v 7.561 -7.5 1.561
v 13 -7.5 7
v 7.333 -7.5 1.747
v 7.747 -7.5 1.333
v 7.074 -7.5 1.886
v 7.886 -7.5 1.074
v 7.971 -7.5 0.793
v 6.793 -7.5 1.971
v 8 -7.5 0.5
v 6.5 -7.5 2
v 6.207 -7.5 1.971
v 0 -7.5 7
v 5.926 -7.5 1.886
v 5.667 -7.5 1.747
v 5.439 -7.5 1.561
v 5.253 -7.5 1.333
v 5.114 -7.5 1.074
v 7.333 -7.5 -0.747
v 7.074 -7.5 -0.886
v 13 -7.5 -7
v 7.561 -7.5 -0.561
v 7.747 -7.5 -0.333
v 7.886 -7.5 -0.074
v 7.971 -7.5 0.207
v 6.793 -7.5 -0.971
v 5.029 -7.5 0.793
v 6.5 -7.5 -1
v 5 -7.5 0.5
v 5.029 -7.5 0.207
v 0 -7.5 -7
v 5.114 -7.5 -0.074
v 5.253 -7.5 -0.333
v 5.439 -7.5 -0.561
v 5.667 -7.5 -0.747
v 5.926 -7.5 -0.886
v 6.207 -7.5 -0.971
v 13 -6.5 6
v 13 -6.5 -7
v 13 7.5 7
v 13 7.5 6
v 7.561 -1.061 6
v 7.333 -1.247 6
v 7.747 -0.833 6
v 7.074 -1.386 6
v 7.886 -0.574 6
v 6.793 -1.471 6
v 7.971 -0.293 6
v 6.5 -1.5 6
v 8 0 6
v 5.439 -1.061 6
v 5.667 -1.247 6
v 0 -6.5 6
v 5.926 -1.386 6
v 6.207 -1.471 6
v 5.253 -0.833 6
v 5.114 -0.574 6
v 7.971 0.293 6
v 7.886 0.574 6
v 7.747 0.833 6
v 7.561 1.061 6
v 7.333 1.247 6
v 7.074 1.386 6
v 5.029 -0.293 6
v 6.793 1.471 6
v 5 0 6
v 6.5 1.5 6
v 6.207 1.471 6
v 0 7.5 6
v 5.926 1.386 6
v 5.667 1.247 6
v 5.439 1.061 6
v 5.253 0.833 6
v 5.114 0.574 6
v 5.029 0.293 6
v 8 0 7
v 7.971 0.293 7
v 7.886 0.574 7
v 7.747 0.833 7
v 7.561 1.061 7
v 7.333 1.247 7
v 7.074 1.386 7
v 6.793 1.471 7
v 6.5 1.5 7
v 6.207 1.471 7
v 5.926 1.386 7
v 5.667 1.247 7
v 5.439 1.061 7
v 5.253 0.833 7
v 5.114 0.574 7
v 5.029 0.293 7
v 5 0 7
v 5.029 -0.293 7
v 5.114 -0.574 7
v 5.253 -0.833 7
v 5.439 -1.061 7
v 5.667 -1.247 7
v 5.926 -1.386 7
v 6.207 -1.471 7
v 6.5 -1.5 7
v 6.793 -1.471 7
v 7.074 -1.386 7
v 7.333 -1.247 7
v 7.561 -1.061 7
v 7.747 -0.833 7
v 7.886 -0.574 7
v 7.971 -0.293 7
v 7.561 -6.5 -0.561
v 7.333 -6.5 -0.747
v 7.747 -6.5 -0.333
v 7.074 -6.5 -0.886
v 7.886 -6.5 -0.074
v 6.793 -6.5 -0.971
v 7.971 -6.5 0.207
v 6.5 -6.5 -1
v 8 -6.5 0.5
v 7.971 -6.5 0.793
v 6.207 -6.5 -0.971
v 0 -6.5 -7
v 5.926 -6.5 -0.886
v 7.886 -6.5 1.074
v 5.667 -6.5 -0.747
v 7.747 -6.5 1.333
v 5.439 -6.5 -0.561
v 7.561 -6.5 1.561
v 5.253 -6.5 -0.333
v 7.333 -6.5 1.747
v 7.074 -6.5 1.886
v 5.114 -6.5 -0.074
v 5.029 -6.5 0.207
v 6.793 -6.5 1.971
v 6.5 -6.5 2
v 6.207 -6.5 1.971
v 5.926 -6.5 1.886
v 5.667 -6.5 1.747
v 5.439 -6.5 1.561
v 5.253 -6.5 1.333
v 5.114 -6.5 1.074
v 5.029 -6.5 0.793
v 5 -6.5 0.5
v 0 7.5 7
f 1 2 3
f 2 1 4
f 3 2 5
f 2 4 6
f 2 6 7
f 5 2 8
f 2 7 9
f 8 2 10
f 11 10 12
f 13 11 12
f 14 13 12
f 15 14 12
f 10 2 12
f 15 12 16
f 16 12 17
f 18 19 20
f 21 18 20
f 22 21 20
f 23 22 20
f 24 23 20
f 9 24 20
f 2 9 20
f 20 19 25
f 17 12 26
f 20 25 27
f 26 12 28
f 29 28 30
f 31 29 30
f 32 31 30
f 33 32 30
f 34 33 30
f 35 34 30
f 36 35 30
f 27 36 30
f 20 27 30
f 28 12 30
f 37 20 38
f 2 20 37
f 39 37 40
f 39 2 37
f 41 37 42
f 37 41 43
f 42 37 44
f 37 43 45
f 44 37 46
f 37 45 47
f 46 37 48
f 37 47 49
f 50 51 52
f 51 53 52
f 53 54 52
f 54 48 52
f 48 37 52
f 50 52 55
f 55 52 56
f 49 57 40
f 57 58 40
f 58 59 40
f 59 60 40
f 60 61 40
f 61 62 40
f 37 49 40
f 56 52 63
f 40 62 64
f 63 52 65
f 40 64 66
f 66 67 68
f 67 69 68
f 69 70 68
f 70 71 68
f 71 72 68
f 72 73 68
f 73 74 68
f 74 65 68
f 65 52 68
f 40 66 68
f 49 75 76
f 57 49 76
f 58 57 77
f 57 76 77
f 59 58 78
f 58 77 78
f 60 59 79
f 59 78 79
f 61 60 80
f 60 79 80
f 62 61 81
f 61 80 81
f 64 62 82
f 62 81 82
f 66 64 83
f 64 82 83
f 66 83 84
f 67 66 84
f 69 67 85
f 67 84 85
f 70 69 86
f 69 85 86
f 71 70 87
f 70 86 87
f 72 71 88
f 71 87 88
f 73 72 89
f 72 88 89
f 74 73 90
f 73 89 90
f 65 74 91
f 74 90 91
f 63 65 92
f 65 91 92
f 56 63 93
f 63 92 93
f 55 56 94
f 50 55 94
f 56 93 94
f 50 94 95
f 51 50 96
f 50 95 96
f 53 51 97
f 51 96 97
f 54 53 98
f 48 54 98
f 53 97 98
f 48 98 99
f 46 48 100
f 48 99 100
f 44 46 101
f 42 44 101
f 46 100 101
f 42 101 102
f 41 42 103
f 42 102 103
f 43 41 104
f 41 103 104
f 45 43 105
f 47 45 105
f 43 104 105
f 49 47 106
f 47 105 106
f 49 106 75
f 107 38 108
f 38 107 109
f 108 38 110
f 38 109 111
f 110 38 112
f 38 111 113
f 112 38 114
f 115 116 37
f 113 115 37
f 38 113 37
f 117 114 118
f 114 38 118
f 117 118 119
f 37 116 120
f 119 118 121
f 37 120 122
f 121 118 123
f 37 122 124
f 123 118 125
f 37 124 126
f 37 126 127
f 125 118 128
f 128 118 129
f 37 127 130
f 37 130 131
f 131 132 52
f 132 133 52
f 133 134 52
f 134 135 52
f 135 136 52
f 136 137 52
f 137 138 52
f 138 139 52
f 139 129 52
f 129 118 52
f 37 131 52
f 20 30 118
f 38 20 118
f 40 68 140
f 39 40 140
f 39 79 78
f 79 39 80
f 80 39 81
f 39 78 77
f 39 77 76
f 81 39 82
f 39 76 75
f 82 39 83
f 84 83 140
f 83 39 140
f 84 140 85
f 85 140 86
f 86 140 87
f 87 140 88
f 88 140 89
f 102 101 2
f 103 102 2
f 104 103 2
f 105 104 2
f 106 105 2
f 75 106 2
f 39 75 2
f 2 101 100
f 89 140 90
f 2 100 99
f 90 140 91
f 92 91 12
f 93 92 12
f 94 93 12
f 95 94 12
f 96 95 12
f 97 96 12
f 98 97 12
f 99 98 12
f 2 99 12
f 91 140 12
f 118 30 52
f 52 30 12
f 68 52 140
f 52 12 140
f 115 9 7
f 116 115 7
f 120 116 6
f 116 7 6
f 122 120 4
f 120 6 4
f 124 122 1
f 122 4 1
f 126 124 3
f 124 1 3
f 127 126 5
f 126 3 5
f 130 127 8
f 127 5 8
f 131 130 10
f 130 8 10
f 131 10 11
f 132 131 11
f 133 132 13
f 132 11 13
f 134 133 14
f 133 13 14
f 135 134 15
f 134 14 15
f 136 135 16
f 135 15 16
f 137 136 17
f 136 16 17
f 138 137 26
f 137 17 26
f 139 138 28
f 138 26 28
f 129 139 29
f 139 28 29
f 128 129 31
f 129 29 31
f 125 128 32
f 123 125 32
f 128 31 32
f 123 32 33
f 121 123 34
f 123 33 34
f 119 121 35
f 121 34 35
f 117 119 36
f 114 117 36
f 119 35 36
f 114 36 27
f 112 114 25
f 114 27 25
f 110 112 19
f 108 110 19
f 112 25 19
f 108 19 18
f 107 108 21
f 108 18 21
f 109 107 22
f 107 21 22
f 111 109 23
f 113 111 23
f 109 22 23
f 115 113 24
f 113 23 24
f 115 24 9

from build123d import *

# Parameters (mm, degrees)
F1_DEPTH = 13
F2_R     = 1.5
F3_DEPTH = 1
F4_R     = 1.5
F5_DEPTH = 1


with BuildPart() as f1:
    # F0 (on Right) → F1 (new body)
    with BuildSketch(Plane.YZ):
        Polygon((-7.5, -7), (-6.5, -7), (-6.5, 6), (7.5, 6), (7.5, 7), (-7.5, 7), align=None)
    extrude(amount=F1_DEPTH)

    # F2 (on face) → F3 (cut, through all)
    with BuildSketch(Plane.XY.offset(7)):
        with Locations((6.5, 0)):
            Circle(F2_R)
    extrude(amount=-F3_DEPTH, mode=Mode.SUBTRACT)

    # F4 (on face) → F5 (cut, through all)
    with BuildSketch(Plane.XZ.offset(7.5)):
        with Locations((6.5, 0.5)):
            Circle(F4_R)
    extrude(amount=-F5_DEPTH, mode=Mode.SUBTRACT)


solid = f1.part
